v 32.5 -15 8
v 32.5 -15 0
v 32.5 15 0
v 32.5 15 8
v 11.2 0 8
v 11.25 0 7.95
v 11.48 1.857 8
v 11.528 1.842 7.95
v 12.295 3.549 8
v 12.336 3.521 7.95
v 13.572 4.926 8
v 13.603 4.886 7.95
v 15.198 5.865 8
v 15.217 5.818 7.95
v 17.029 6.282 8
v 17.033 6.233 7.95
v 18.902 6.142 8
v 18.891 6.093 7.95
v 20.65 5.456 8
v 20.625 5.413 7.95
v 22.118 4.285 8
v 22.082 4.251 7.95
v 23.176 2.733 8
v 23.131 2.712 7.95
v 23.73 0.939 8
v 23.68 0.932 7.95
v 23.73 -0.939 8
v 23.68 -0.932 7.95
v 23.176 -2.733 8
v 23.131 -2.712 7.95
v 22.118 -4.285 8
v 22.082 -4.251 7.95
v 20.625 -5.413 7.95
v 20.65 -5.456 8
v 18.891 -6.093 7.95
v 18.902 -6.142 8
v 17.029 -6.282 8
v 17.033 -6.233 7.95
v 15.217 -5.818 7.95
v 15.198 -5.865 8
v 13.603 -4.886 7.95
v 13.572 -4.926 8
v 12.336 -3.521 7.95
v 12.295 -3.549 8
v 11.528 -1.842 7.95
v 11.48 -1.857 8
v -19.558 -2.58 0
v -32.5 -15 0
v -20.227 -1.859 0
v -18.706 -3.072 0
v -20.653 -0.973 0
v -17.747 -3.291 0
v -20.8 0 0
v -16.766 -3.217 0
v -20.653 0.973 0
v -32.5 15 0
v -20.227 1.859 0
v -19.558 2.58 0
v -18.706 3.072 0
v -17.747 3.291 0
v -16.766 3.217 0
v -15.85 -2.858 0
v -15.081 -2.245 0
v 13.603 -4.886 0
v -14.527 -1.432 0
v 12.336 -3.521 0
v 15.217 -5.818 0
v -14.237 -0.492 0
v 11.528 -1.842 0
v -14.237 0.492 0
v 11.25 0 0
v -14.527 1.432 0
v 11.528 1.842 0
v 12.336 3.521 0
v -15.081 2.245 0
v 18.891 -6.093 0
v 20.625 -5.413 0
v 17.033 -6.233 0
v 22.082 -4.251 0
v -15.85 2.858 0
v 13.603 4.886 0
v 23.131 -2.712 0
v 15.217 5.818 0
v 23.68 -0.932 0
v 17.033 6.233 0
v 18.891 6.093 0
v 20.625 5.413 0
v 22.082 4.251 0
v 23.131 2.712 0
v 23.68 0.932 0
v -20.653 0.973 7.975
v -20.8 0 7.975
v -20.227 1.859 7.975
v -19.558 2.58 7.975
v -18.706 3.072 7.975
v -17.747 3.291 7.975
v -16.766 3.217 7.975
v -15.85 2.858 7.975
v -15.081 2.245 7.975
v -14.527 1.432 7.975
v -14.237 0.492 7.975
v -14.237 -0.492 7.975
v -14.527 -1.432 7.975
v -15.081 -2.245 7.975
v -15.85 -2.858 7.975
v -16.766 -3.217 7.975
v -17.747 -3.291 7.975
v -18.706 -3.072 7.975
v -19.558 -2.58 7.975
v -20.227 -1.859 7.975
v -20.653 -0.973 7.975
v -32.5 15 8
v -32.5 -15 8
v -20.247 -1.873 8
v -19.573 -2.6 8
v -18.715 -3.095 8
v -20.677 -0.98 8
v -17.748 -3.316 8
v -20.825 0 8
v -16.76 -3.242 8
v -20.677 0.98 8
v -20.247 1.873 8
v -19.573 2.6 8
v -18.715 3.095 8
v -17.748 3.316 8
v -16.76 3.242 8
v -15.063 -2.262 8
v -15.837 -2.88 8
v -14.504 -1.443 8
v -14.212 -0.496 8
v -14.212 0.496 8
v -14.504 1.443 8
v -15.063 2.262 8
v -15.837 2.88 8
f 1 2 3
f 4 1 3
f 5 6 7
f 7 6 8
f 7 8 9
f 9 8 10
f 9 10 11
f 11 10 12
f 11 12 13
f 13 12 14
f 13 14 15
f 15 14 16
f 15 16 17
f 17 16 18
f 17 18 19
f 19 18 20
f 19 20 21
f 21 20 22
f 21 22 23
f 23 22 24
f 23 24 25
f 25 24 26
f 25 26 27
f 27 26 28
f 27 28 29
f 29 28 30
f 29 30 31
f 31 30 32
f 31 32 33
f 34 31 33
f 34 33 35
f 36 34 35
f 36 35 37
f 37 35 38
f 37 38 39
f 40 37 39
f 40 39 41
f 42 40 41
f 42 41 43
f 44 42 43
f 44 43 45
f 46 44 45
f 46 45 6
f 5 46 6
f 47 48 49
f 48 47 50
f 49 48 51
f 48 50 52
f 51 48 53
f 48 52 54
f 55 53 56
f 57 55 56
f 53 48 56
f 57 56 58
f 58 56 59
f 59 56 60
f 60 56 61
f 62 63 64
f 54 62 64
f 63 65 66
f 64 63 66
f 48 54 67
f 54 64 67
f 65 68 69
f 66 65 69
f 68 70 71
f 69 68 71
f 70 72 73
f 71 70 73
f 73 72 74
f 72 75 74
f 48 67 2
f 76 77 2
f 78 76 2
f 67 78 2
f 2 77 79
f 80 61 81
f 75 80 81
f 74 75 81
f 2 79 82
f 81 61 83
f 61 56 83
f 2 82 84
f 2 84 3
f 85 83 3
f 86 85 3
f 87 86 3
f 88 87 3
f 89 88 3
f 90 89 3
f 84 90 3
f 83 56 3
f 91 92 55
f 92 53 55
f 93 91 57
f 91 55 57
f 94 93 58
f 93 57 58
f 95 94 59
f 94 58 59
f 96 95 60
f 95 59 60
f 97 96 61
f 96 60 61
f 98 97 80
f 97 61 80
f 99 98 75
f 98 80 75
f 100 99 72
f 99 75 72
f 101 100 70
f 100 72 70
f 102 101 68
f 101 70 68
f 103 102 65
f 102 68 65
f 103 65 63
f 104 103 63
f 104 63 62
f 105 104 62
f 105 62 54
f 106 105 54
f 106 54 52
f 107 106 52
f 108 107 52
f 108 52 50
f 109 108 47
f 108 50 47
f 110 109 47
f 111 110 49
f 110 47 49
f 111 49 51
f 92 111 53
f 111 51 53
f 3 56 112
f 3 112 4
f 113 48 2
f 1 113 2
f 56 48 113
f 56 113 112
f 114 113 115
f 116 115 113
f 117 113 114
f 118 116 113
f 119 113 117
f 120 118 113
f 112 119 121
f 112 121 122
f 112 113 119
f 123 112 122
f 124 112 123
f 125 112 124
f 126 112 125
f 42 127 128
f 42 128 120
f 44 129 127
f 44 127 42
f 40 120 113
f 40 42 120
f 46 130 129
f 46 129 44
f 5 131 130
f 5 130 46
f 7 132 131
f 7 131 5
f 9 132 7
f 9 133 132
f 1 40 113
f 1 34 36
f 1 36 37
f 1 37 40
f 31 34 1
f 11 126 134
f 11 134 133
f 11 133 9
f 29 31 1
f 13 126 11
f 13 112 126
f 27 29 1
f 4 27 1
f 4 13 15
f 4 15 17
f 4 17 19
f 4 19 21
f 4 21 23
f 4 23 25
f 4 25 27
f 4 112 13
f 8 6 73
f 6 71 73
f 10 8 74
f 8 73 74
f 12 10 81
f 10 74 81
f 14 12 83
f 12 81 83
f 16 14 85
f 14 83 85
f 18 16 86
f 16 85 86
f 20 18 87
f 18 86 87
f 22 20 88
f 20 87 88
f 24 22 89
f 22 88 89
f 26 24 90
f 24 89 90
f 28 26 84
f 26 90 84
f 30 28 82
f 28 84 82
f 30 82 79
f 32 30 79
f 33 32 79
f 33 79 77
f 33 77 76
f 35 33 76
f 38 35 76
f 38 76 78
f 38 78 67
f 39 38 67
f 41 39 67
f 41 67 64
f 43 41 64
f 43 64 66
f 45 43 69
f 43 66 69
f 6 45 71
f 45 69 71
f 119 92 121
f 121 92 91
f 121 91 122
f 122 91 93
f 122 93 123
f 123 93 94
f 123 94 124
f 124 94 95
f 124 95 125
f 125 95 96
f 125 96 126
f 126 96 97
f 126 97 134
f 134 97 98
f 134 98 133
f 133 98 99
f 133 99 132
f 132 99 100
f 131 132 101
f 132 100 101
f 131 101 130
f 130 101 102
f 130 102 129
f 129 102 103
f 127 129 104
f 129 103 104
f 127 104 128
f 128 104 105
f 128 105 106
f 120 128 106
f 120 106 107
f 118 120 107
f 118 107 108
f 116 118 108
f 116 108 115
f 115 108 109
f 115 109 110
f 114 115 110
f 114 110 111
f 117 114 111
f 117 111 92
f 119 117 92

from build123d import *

# Parameters (mm, degrees)
SKETCH_1_W                   = 65
SKETCH_1_H                   = 30
EXTRUDE_1_DEPTH              = 8
HOLE_WIZARD_M6_1_D           = 6.6
HOLE_WIZARD_M6_1_DEPTH       = 20
HOLE_WIZARD_M6_1_CSINK_D     = 6.65
HOLE_WIZARD_M6_1_CSINK_ANGLE = 90
HOLE_WIZARD_M6_1_TIP         = 1.982840043
HOLE_WIZARD_M6_2_D           = 12.5
HOLE_WIZARD_M6_2_DEPTH       = 20
HOLE_WIZARD_M6_2_CSINK_D     = 12.6
HOLE_WIZARD_M6_2_CSINK_ANGLE = 90
HOLE_WIZARD_M6_2_TIP         = 3.755378869


with BuildPart() as part:
    # 草图1 → 凸台-拉伸1 (new body)
    with BuildSketch(Plane.XY):
        Rectangle(SKETCH_1_W, SKETCH_1_H)
    extrude(amount=EXTRUDE_1_DEPTH)

    # M6 间隙槽口1
    with Locations(Plane.XY.offset(8)):
        with Locations((-17.5, 0)):
            CounterSinkHole(HOLE_WIZARD_M6_1_D / 2, HOLE_WIZARD_M6_1_CSINK_D / 2, depth=HOLE_WIZARD_M6_1_DEPTH, counter_sink_angle=HOLE_WIZARD_M6_1_CSINK_ANGLE)
            with Locations((0, 0, -(HOLE_WIZARD_M6_1_DEPTH + HOLE_WIZARD_M6_1_TIP / 2))):  # 118° drill point
                Cone(0, HOLE_WIZARD_M6_1_D / 2, HOLE_WIZARD_M6_1_TIP, mode=Mode.SUBTRACT)

    # M6 间隙槽口2
    with Locations(Plane.XY.offset(8)):
        with Locations((17.5, 0)):
            CounterSinkHole(HOLE_WIZARD_M6_2_D / 2, HOLE_WIZARD_M6_2_CSINK_D / 2, depth=HOLE_WIZARD_M6_2_DEPTH, counter_sink_angle=HOLE_WIZARD_M6_2_CSINK_ANGLE)
            with Locations((0, 0, -(HOLE_WIZARD_M6_2_DEPTH + HOLE_WIZARD_M6_2_TIP / 2))):  # 118° drill point
                Cone(0, HOLE_WIZARD_M6_2_D / 2, HOLE_WIZARD_M6_2_TIP, mode=Mode.SUBTRACT)


solid = part.part
